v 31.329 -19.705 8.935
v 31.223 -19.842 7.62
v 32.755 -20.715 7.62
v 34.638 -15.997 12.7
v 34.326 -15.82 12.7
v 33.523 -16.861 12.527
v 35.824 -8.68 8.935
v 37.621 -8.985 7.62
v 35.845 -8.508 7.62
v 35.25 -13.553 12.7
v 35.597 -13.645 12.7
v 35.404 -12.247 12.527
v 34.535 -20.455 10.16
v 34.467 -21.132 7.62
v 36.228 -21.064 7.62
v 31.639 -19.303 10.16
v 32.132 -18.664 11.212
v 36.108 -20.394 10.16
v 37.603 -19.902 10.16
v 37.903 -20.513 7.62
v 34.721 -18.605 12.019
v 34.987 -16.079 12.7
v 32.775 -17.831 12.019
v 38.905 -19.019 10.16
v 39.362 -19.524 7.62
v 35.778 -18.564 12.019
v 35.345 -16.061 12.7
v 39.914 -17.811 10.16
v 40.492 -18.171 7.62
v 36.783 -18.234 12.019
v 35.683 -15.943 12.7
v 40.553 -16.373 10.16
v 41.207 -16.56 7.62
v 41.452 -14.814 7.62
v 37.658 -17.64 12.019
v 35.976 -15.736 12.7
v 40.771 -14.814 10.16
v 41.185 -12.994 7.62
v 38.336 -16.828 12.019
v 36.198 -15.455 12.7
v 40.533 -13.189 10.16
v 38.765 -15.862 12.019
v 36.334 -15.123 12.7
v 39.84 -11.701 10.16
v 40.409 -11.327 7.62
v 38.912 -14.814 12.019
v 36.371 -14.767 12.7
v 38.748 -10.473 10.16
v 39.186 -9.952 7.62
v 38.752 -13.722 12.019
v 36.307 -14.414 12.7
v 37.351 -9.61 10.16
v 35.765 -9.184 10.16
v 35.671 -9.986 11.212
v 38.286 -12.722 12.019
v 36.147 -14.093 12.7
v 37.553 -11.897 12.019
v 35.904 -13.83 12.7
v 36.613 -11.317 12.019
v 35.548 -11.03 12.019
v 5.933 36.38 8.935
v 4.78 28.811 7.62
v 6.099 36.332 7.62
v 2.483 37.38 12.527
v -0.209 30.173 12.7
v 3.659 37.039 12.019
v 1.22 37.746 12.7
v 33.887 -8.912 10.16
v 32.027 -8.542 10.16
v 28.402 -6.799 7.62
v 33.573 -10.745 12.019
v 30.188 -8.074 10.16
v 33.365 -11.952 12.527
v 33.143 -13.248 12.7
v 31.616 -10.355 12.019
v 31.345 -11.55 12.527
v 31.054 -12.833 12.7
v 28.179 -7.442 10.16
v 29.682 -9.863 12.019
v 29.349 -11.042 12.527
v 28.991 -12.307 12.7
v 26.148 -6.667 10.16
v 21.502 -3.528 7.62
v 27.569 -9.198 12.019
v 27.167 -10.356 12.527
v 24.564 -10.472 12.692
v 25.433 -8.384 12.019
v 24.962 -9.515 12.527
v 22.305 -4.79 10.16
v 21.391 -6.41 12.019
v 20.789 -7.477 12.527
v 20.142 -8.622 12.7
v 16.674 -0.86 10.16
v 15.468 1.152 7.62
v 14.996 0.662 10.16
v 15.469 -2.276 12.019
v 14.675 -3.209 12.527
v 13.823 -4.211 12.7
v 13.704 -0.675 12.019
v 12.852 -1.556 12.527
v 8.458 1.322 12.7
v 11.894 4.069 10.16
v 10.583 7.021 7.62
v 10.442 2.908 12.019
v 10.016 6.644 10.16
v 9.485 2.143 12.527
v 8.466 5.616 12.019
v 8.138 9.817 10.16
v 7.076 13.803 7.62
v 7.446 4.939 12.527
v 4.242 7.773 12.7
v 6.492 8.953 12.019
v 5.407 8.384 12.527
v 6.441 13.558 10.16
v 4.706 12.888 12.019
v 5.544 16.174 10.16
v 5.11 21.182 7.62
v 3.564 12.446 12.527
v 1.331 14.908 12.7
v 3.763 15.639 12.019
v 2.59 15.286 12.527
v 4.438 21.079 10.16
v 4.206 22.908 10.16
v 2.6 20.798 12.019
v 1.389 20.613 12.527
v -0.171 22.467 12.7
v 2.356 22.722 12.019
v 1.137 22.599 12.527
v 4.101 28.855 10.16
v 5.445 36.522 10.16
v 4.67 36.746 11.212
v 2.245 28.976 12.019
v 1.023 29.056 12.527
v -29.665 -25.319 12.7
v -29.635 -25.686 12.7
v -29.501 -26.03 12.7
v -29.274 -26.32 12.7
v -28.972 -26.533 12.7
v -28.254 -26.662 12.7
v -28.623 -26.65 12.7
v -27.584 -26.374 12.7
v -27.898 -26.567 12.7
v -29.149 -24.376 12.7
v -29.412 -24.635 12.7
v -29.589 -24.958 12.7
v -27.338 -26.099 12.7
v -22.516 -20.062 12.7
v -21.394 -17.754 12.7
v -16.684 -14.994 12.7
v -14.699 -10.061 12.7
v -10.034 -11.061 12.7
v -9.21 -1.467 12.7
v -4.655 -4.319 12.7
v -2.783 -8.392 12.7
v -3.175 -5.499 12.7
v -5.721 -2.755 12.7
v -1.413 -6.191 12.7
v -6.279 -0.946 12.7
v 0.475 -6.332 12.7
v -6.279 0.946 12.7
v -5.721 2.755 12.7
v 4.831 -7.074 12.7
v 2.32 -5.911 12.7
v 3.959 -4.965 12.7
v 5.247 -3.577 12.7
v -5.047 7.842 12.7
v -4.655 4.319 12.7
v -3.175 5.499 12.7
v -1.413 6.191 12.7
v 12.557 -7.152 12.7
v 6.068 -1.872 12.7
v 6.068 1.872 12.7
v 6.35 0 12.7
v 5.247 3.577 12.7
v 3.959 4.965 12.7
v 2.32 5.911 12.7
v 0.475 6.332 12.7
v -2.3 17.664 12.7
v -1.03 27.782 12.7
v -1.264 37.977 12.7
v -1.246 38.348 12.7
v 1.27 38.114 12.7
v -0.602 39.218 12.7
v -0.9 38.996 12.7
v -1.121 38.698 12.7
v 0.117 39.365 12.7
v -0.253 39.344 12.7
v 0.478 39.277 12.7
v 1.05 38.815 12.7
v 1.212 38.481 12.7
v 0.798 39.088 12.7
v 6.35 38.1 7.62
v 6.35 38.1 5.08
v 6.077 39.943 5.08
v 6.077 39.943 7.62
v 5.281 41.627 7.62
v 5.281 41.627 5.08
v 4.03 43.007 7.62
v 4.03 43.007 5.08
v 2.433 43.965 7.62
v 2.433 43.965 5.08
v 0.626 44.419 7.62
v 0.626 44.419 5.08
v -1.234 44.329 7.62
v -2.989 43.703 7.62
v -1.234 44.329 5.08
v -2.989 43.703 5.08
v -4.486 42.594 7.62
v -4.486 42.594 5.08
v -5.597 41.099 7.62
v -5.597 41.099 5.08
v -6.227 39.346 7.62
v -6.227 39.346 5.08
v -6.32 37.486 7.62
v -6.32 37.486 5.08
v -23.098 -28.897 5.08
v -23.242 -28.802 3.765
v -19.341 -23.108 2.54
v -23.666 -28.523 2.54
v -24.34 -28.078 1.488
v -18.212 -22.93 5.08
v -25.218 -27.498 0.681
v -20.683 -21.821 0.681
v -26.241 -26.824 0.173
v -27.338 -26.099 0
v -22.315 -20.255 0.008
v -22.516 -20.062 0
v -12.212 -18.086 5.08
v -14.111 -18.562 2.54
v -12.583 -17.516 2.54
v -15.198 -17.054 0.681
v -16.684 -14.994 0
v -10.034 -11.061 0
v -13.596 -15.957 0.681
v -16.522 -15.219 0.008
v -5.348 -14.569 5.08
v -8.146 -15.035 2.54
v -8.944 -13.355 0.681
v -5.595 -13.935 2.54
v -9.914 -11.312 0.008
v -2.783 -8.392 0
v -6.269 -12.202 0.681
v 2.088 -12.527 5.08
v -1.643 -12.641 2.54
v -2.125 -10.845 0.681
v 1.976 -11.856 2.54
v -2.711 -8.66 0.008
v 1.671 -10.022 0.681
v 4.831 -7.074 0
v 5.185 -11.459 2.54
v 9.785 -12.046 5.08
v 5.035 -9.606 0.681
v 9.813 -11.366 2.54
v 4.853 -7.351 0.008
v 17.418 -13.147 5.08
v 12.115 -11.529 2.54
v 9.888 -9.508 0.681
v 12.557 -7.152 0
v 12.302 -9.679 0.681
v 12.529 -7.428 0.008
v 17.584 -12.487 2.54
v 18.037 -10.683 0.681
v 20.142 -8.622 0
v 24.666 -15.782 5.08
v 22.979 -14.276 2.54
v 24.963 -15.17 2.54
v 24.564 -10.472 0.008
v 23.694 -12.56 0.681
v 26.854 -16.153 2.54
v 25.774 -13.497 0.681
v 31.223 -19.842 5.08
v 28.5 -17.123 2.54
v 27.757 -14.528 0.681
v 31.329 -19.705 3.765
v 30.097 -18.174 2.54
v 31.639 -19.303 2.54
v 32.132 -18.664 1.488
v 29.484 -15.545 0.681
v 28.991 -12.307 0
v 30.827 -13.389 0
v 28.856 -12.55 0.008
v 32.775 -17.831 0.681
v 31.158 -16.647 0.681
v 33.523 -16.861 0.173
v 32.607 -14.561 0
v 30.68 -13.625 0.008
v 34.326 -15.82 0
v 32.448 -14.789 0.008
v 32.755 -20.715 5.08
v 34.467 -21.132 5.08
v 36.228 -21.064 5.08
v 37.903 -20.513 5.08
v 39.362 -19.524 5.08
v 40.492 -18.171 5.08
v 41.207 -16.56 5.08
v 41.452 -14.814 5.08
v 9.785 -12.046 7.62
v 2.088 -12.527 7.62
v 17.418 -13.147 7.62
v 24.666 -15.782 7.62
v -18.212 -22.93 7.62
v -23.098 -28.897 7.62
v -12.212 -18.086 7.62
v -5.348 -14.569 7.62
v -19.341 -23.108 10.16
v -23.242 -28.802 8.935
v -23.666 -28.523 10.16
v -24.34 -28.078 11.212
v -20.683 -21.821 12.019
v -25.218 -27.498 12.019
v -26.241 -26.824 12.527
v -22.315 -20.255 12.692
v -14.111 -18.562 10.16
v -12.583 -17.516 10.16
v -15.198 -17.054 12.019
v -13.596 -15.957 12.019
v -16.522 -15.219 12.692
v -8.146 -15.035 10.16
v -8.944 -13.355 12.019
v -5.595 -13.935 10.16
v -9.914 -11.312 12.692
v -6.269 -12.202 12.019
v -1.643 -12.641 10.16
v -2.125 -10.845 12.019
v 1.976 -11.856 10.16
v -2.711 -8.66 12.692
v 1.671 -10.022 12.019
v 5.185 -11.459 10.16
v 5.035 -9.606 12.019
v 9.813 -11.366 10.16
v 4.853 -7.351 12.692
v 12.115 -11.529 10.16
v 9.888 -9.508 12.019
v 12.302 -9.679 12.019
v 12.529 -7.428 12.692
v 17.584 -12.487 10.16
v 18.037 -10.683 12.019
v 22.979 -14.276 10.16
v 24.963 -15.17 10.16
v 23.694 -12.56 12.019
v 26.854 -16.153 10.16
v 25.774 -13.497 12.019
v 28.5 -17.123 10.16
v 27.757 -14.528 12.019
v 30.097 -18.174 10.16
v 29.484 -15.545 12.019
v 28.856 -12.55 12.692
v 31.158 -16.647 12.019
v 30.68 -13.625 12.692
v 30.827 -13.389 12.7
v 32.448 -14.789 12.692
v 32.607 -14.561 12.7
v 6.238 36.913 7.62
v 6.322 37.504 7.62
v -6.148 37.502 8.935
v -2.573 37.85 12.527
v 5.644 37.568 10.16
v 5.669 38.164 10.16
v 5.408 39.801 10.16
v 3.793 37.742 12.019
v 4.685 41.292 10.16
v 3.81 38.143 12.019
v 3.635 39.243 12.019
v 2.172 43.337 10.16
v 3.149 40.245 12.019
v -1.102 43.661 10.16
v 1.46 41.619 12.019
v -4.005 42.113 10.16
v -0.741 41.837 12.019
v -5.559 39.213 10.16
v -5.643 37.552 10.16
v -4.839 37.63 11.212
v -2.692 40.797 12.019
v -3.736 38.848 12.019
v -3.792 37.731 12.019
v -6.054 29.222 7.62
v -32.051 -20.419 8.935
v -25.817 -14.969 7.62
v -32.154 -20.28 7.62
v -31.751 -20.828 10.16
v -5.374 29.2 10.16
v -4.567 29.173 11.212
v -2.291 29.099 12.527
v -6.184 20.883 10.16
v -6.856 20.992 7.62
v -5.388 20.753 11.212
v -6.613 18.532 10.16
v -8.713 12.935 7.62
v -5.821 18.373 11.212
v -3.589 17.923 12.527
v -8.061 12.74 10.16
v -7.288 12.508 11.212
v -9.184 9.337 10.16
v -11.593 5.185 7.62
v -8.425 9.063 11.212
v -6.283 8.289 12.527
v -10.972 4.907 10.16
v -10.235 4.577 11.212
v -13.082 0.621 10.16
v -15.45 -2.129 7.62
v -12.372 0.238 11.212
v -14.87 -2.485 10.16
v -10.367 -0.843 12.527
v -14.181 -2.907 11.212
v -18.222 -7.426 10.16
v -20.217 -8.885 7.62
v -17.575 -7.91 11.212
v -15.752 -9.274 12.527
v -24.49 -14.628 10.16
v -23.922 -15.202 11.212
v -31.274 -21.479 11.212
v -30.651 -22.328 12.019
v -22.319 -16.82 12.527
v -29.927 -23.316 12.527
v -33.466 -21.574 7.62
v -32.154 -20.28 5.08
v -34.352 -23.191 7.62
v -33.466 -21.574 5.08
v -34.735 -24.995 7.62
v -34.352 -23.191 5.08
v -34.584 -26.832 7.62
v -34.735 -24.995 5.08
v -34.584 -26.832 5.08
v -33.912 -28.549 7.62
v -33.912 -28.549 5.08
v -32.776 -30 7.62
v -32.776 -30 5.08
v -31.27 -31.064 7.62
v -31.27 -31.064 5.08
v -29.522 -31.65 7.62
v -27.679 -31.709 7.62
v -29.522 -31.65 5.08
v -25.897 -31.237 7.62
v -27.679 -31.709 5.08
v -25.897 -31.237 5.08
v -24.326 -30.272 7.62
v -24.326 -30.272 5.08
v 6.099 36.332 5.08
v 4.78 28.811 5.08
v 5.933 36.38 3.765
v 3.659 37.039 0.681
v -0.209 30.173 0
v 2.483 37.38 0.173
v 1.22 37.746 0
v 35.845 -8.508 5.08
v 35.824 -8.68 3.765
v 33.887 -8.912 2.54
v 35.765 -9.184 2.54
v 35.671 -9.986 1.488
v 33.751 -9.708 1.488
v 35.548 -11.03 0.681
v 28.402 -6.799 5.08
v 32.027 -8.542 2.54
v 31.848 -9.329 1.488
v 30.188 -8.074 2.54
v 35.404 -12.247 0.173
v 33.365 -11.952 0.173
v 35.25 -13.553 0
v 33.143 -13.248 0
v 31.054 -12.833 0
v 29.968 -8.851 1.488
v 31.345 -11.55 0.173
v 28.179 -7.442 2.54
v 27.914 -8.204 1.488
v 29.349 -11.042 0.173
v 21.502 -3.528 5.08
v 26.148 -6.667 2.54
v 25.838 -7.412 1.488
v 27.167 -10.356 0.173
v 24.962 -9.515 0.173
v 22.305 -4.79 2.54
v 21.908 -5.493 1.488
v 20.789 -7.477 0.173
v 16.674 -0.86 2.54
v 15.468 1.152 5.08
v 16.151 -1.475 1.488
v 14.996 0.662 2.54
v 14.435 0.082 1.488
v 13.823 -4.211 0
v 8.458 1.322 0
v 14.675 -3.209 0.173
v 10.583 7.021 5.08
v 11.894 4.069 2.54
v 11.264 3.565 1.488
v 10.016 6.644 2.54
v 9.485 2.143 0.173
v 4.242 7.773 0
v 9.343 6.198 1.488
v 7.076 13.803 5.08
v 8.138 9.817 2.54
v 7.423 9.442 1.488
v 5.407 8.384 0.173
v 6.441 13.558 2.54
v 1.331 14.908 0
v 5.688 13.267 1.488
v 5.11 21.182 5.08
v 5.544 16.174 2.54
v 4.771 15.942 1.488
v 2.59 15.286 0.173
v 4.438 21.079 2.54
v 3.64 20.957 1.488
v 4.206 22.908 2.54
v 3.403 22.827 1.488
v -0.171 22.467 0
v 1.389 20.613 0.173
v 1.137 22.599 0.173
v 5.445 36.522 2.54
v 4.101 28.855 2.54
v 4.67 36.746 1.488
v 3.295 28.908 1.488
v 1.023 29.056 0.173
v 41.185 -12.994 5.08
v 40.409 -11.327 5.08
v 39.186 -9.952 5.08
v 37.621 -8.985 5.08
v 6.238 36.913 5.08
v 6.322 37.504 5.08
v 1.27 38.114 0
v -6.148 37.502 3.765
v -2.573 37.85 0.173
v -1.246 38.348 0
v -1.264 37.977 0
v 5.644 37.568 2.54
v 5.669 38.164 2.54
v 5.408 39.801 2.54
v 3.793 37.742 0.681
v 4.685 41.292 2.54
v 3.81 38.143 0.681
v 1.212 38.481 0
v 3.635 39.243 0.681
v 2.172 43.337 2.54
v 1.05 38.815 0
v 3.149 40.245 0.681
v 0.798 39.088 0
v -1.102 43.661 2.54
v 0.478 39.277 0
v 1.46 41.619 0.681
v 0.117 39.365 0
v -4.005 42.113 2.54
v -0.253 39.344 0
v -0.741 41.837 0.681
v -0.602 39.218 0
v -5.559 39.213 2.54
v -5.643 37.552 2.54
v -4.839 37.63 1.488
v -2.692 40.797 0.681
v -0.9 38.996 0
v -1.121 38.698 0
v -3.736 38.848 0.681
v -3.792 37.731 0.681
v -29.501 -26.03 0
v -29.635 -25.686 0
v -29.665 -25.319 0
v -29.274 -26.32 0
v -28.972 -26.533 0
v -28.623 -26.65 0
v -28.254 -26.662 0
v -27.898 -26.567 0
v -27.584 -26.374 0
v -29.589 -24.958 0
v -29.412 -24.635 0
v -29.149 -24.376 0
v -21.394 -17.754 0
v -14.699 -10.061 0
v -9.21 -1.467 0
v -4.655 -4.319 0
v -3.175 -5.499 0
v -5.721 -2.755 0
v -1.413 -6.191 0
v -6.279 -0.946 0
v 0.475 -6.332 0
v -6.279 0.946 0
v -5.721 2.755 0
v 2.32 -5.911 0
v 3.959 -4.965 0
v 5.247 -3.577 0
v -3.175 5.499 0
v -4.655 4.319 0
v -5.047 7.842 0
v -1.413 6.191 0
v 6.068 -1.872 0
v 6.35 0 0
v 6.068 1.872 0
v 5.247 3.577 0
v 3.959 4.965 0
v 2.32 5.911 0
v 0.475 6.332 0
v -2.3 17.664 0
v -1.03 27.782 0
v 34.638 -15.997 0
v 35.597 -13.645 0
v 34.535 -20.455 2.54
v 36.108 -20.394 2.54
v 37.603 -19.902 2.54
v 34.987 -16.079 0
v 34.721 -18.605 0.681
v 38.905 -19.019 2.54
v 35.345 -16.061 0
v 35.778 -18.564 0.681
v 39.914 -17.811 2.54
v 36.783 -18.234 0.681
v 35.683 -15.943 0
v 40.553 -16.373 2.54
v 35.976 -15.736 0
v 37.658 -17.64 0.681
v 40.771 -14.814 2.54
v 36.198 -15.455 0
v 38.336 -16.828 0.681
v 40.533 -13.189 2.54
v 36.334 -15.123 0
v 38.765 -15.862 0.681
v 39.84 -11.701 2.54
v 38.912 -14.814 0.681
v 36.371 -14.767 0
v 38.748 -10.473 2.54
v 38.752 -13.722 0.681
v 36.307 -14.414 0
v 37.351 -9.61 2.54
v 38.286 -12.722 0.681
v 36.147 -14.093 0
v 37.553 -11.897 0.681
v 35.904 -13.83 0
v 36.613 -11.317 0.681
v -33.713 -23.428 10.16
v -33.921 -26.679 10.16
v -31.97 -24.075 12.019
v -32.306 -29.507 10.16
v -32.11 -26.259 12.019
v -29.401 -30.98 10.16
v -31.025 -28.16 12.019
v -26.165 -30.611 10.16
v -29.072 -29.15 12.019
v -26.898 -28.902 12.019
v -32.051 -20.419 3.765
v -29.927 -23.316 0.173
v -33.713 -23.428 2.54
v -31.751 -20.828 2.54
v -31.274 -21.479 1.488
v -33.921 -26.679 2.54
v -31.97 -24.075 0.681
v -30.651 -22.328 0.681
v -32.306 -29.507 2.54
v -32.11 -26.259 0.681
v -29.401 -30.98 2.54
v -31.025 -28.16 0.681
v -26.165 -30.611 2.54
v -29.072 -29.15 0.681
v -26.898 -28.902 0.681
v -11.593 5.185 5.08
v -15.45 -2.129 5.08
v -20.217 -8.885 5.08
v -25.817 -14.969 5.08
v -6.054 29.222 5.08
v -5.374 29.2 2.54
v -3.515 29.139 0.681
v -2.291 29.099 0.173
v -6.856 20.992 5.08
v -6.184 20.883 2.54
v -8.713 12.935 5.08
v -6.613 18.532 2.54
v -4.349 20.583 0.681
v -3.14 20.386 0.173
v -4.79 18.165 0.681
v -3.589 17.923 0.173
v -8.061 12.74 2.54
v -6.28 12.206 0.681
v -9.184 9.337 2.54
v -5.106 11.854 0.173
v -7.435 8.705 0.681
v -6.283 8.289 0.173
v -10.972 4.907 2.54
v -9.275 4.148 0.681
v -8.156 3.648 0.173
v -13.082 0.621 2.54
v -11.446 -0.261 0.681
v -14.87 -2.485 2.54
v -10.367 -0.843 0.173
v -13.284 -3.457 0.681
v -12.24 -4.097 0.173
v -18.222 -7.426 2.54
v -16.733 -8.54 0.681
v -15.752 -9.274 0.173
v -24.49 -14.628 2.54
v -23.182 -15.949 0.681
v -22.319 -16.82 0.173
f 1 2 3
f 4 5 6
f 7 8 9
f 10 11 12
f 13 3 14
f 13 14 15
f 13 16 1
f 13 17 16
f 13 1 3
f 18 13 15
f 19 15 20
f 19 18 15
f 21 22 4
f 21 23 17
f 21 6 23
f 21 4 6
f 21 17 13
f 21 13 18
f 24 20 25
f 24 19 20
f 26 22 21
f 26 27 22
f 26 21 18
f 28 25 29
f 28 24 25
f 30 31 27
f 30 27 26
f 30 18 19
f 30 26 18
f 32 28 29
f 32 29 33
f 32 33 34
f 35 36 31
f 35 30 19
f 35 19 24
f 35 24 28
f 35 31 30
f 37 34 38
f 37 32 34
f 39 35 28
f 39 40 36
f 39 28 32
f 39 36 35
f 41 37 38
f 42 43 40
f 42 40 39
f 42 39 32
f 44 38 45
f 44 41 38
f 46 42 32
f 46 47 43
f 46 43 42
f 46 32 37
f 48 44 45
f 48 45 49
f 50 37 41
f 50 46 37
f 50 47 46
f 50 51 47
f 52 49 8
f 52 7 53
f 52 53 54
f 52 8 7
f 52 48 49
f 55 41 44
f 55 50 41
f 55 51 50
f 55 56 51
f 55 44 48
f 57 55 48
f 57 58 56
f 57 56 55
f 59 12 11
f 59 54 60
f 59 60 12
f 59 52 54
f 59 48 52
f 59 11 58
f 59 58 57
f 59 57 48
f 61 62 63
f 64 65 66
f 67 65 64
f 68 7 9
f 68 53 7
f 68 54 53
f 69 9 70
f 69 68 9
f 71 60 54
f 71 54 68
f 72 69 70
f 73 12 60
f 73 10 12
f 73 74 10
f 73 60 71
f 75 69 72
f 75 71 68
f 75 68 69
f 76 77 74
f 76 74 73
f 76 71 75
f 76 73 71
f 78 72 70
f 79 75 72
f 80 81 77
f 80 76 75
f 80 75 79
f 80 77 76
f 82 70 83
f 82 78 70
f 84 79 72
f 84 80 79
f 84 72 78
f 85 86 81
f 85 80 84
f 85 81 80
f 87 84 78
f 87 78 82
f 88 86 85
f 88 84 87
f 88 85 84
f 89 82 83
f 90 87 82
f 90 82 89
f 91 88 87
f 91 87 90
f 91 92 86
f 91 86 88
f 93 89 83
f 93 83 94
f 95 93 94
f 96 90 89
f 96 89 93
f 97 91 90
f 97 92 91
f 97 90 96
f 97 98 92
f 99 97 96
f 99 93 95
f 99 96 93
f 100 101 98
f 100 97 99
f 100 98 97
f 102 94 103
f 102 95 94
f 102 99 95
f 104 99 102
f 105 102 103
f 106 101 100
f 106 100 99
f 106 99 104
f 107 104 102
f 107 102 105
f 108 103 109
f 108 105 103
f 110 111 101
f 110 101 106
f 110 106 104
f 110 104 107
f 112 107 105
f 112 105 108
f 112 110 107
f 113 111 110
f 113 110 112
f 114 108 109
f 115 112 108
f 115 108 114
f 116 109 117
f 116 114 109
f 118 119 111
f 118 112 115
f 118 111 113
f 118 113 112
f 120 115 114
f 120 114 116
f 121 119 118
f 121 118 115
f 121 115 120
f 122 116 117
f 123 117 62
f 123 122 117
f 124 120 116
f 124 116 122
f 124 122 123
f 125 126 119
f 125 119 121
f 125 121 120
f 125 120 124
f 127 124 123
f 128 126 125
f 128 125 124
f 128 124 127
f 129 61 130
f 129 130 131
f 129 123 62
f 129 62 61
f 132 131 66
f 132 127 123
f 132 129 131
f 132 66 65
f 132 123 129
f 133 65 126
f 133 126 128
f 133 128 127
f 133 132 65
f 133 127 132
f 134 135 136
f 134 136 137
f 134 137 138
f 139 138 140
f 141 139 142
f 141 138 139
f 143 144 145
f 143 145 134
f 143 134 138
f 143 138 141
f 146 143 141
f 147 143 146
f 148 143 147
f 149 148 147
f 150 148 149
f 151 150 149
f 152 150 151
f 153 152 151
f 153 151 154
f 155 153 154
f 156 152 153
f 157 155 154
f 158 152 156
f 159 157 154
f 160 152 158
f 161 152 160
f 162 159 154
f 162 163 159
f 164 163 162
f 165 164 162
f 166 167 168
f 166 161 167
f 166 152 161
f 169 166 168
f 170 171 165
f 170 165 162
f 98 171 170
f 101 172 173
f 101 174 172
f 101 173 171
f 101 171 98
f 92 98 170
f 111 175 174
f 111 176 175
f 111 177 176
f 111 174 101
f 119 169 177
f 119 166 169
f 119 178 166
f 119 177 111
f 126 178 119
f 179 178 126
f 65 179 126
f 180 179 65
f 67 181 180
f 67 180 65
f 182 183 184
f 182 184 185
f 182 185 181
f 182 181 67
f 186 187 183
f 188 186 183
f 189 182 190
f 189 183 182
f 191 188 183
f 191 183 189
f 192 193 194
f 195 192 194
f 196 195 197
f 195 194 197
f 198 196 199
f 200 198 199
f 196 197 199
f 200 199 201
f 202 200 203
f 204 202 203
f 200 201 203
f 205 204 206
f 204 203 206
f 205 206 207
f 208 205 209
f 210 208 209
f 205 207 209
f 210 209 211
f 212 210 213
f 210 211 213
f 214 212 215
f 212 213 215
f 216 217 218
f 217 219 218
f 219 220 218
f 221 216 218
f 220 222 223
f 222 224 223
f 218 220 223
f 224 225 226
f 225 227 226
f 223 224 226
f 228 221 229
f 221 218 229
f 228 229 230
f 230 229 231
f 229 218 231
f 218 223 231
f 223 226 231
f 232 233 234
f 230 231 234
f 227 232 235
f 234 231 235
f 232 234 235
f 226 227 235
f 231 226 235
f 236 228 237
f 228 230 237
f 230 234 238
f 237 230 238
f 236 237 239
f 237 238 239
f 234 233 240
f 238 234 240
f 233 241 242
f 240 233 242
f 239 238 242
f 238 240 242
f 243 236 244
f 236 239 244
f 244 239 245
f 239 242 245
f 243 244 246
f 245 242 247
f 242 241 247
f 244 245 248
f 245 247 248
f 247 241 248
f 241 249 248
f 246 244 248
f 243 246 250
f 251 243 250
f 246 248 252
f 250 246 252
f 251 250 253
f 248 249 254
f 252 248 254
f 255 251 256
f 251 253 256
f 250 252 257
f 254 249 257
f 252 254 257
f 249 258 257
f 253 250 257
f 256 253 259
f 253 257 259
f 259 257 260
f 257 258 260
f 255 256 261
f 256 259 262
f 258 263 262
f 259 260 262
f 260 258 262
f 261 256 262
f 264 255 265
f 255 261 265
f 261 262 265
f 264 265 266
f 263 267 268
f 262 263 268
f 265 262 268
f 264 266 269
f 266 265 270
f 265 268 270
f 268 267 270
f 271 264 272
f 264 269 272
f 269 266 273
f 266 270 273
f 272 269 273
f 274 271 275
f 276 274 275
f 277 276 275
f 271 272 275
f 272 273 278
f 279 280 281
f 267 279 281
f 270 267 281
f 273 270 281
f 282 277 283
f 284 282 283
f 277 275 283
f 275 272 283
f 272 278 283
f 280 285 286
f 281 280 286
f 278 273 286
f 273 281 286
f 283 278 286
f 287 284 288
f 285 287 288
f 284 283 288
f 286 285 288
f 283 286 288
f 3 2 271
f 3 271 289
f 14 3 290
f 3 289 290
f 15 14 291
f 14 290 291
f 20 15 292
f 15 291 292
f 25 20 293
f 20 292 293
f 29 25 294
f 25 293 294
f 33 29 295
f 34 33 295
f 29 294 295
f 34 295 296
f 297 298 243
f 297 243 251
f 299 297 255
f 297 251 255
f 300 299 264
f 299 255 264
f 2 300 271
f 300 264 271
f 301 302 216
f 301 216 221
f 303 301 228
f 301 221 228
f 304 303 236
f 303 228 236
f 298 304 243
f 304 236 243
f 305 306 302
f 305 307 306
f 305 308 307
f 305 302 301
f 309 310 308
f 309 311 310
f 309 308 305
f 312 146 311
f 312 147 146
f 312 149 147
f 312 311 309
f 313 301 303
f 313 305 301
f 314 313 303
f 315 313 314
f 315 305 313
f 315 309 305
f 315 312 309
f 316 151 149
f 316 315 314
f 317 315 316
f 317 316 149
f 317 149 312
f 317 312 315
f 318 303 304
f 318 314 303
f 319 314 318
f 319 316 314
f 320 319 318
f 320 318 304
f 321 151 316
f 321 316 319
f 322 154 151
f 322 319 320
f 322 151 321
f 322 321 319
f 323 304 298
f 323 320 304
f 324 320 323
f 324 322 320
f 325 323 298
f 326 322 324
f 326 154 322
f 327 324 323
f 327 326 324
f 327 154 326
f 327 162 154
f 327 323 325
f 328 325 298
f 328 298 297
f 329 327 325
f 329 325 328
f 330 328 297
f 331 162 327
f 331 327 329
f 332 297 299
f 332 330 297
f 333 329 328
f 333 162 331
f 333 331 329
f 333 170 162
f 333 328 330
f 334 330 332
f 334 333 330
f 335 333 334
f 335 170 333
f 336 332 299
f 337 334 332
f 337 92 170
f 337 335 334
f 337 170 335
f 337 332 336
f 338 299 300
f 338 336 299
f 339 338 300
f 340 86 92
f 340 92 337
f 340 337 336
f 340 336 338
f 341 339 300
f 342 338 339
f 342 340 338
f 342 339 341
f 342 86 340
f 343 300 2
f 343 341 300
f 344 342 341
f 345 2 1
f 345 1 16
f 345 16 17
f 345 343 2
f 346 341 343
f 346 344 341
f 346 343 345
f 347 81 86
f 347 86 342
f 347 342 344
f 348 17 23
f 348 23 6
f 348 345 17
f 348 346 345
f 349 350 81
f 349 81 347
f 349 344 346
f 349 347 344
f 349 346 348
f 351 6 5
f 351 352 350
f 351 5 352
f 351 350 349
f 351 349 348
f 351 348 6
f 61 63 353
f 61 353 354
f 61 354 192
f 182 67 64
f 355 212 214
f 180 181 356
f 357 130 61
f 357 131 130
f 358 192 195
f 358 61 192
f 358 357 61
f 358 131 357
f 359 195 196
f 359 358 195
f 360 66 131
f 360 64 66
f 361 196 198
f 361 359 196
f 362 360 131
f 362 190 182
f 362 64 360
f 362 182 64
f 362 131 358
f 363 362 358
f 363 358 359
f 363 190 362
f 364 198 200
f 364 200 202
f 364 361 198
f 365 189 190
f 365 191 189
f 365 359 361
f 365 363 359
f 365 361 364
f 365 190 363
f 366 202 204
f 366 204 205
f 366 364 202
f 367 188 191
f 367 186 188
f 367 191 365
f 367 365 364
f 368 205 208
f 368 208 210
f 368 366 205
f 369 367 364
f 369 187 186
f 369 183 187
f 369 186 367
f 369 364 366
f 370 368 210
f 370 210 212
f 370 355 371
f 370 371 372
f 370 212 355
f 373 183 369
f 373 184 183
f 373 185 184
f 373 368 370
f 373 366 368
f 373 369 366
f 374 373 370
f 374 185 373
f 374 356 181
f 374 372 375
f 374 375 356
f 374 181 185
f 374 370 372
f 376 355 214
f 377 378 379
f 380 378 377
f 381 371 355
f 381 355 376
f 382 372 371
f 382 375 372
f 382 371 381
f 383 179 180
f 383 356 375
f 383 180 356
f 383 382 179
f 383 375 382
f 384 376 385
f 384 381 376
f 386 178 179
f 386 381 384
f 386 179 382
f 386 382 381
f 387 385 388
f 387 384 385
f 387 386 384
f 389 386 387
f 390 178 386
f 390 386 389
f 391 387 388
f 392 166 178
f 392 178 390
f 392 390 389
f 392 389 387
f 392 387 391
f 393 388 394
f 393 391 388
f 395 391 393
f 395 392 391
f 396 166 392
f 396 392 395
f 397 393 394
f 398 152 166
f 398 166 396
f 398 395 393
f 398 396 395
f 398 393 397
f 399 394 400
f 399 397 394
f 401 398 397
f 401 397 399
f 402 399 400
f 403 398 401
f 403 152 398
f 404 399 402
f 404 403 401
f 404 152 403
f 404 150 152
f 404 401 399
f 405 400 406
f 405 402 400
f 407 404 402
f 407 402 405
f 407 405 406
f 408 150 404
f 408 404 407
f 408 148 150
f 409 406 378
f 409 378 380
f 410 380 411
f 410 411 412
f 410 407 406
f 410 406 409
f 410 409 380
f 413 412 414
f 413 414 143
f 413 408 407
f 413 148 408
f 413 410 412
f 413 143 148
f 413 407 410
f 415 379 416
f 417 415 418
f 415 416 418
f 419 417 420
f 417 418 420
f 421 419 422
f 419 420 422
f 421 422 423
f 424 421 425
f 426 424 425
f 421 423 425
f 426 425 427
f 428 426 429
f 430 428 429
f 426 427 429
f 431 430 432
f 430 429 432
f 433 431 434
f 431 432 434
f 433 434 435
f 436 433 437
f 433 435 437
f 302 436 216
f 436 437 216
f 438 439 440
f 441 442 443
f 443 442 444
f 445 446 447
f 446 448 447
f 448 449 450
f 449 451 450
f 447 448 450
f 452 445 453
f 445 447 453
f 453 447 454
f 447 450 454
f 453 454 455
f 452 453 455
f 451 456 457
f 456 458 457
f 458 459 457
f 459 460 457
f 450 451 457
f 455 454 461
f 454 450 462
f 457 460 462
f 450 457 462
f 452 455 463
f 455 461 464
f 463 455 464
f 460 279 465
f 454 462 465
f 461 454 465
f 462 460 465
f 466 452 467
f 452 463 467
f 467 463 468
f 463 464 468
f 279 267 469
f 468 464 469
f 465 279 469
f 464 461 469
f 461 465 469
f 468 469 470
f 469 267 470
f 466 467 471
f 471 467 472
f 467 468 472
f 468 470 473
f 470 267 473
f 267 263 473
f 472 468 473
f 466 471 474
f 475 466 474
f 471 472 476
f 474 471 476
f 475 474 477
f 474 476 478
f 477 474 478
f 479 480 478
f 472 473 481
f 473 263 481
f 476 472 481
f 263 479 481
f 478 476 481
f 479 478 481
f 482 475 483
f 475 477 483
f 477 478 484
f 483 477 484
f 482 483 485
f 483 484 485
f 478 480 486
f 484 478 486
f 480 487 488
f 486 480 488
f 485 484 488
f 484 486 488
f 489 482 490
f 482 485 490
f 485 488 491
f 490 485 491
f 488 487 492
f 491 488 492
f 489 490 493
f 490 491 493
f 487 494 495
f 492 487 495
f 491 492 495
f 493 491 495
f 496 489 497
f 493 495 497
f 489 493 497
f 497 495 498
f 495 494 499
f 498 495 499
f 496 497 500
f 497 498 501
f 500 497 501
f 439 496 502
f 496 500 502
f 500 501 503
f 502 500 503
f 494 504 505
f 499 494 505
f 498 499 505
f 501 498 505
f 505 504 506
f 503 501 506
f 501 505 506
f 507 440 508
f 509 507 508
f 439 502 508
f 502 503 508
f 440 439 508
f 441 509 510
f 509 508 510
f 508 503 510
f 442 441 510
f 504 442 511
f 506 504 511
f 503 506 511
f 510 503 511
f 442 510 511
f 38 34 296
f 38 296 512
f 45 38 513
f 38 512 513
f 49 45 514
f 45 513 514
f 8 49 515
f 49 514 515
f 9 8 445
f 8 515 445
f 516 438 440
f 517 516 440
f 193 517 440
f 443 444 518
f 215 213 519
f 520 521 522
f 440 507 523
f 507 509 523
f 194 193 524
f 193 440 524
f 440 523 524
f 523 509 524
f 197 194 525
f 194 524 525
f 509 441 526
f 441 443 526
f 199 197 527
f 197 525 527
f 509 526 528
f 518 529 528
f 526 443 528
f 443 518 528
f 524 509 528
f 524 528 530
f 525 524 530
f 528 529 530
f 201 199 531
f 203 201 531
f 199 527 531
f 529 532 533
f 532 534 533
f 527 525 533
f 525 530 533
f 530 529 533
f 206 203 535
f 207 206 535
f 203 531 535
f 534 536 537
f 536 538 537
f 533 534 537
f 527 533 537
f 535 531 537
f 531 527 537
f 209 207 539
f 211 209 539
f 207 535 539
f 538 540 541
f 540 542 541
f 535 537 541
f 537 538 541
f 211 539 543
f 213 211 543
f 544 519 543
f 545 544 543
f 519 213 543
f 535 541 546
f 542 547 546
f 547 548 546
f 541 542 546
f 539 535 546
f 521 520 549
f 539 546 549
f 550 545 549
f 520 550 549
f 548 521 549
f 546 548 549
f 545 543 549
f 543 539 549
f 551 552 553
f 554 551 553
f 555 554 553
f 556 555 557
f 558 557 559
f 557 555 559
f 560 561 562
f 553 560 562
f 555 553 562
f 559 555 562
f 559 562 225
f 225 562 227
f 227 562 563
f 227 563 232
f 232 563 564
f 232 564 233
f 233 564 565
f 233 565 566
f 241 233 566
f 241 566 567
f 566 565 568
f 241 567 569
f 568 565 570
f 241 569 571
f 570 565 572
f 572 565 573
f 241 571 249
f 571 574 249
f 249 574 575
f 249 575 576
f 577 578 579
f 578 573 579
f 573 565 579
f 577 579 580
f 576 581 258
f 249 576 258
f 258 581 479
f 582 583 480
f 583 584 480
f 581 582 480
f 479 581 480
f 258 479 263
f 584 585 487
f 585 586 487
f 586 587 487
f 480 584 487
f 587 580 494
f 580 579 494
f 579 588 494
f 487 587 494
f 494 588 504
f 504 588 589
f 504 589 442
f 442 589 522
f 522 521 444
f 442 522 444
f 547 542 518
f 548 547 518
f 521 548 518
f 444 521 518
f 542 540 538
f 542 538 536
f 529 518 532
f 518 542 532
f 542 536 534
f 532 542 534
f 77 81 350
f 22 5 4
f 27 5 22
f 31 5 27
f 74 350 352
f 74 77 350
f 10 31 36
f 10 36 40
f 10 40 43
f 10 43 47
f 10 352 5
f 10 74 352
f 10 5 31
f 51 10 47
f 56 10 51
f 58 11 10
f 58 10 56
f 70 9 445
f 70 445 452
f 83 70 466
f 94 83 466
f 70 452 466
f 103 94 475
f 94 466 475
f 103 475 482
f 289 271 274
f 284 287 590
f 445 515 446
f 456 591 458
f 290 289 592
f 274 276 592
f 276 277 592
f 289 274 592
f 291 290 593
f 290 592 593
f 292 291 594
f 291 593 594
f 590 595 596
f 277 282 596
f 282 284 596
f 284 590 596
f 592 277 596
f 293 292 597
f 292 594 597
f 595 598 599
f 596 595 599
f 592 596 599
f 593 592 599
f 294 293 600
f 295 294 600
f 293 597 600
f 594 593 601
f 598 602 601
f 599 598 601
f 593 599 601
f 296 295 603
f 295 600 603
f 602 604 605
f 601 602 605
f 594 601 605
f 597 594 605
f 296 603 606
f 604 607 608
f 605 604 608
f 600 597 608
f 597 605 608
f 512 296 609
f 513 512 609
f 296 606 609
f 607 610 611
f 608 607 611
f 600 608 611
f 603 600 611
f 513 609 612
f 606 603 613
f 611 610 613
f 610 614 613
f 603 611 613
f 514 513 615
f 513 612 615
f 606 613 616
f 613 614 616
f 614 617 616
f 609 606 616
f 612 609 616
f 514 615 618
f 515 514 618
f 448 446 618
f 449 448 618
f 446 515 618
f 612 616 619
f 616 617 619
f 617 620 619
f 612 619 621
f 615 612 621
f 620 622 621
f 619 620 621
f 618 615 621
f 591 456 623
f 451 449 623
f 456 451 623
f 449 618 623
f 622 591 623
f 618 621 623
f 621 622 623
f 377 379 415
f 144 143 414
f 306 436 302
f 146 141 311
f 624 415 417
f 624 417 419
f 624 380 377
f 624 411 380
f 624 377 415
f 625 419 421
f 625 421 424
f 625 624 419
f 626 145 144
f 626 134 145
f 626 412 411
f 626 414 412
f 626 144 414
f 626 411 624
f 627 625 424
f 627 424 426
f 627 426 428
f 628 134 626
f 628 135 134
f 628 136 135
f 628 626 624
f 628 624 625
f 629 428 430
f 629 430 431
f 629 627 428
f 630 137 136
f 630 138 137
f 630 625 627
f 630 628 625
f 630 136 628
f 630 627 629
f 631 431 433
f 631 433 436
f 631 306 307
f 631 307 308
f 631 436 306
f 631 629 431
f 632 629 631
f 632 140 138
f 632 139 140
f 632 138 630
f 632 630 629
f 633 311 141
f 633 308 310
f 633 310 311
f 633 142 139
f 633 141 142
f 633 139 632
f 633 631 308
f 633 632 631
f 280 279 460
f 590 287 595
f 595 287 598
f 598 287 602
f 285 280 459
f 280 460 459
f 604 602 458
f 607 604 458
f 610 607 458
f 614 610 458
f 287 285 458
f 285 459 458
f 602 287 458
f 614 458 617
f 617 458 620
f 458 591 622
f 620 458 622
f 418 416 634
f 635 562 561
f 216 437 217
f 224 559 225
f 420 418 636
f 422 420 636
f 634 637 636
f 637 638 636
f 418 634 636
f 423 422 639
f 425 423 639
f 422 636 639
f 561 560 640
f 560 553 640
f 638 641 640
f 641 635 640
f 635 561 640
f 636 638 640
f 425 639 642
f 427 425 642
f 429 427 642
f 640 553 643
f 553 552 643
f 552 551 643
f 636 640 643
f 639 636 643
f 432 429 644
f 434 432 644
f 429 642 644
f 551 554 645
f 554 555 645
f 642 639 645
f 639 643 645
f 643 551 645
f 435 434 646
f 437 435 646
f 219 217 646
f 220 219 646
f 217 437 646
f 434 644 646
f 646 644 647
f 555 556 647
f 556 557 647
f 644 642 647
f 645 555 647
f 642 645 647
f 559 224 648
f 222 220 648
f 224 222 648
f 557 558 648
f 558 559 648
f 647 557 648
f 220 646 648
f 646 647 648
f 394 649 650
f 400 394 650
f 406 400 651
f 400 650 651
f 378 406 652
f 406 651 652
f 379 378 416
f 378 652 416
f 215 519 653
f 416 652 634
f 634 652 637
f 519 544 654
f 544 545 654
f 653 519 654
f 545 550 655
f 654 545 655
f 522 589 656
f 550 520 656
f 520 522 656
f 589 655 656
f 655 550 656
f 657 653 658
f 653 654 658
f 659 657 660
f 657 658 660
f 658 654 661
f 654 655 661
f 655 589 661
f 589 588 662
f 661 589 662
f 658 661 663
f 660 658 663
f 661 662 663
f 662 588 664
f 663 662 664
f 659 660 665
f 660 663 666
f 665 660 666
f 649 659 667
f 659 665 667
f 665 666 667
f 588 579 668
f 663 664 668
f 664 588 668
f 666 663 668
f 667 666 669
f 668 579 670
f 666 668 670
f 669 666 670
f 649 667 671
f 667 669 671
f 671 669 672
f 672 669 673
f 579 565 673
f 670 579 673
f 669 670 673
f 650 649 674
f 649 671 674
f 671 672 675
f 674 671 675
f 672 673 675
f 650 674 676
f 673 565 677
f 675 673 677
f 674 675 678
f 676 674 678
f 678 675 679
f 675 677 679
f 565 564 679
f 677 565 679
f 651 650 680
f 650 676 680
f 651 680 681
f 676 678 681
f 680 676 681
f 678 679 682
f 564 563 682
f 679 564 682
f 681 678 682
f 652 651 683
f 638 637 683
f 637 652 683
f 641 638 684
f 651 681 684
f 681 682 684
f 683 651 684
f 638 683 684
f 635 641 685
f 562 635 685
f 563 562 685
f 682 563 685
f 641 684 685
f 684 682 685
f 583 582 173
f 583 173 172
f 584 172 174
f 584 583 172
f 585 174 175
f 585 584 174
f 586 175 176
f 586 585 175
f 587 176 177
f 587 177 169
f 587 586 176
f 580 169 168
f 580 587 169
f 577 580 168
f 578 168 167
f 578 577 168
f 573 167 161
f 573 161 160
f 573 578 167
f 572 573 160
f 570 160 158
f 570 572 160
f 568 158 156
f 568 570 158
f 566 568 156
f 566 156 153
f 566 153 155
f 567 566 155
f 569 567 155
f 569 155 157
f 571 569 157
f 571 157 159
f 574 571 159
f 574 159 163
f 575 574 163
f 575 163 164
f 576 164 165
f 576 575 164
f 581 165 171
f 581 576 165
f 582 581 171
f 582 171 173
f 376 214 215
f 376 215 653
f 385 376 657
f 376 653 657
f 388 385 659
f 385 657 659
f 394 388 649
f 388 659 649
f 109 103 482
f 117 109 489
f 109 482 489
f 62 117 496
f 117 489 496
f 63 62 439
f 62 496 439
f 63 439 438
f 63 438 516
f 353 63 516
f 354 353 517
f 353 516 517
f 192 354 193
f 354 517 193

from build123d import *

# Parameters (mm, degrees)
F0_R         = 6.35
F1_DEPTH     = 12.7
F2_T2_ANGLE  = 99.446116479
F2_T4_ANGLE  = 59.2916827944
F2_T6_ANGLE  = 201.7148311049
F2_T8_ANGLE  = 200.3212768017
F2_T10_ANGLE = 94.2324188496
F2_T12_ANGLE = 210.9341102164
F2_T14_ANGLE = 94.2324188496
F2_T16_ANGLE = 210.9341102164
F2_T18_ANGLE = 200.3212768017
F2_T20_ANGLE = 59.2916827944
F2_T22_ANGLE = 201.7148311049
F2_T24_ANGLE = 99.446116479


# Not quite as in the source:
# - a fillet or chamfer that OpenCascade refuses, or shapes differently, is made with other operations: its cross-section is extruded or revolved along the edge and cut away or added


with BuildPart() as f1:
    # F0 (on Top) → F1 (new body)
    with BuildSketch(Plane.XY):
        with BuildLine():
            ThreePointArc((-23.0979636954, -28.8973481426), (-12.2116587197, -18.0861984821), (2.0883176929, -12.527127732))
            ThreePointArc((2.0883176929, -12.527127732), (-10.0506029407, -7.7637220795), (-11.5934607492, 5.1847534038))
            ThreePointArc((-11.5934607492, 5.1847534038), (-20.2173700121, -8.8847131705), (-32.1537121721, -20.2796873478))
            ThreePointArc((-32.1537121721, -20.2796873478), (-25.5280345903, -19.7355993147), (-22.0480633142, -25.4))
            ThreePointArc((-22.0480633142, -25.4), (-22.3161995958, -27.2257693475), (-23.0979636954, -28.8973481426))
        make_face()
        with BuildLine():
            ThreePointArc((10.5830984733, 7.0205431916), (12.1592629425, 3.6663775985), (12.7, 0))
            ThreePointArc((12.7, 0), (9.6905013983, -8.2087869171), (2.0883176929, -12.527127732))
            ThreePointArc((2.0883176929, -12.527127732), (17.4183090092, -13.1467749254), (31.2229657331, -19.8418514101))
            ThreePointArc((31.2229657331, -19.8418514101), (29.2220209534, -12.4165925694), (35.8447458338, -8.5079145294))
            ThreePointArc((35.8447458338, -8.5079145294), (21.5024747262, -3.5278630909), (10.5830984733, 7.0205431916))
        make_face()
        with BuildLine():
            ThreePointArc((-11.5934607492, 5.1847534038), (-1.0477304131, 12.6567081416), (10.5830984733, 7.0205431916))
            ThreePointArc((10.5830984733, 7.0205431916), (5.1104904876, 21.1821889646), (6.0989820006, 36.3322560831))
            ThreePointArc((6.0989820006, 36.3322560831), (-0.5872613397, 31.7772138958), (-6.320221624, 37.4857536138))
            ThreePointArc((-6.320221624, 37.4857536138), (-6.8559724512, 20.992280129), (-11.5934607492, 5.1847534038))
        make_face()
        with BuildLine():
            ThreePointArc((2.0883176929, -12.527127732), (9.6905013983, -8.2087869171), (12.7, 0))
            ThreePointArc((12.7, 0), (12.1592629425, 3.6663775985), (10.5830984733, 7.0205431916))
            ThreePointArc((10.5830984733, 7.0205431916), (-1.0477304131, 12.6567081416), (-11.5934607492, 5.1847534038))
            ThreePointArc((-11.5934607492, 5.1847534038), (-10.0506029407, -7.7637220795), (2.0883176929, -12.527127732))
        make_face()
        Circle(F0_R, mode=Mode.SUBTRACT)
        with BuildLine():
            ThreePointArc((-32.1537121721, -20.2796873478), (-32.7755456308, -30.0000161487), (-23.0979636954, -28.8973481426))
            ThreePointArc((-23.0979636954, -28.8973481426), (-22.3161995958, -27.2257693475), (-22.0480633142, -25.4))
            ThreePointArc((-22.0480633142, -25.4), (-25.5280345903, -19.7355993147), (-32.1537121721, -20.2796873478))
        make_face()
        with BuildLine():
            ThreePointArc((41.4519366858, -14.8143187798), (39.8474260225, -10.5949786709), (35.8447458338, -8.5079145294))
            ThreePointArc((35.8447458338, -8.5079145294), (29.2220209534, -12.4165925694), (31.2229657331, -19.8418514101))
            ThreePointArc((31.2229657331, -19.8418514101), (37.9029217313, -20.5131768035), (41.4519366858, -14.8143187798))
        make_face()
        with BuildLine():
            ThreePointArc((-6.320221624, 37.4857536138), (-0.5872613397, 31.7772138958), (6.0989820006, 36.3322560831))
            ThreePointArc((6.0989820006, 36.3322560831), (6.2869323085, 37.2072614336), (6.35, 38.1))
            ThreePointArc((6.35, 38.1), (-0.3074838917, 44.442551037), (-6.320221624, 37.4857536138))
        make_face()
    extrude(amount=F1_DEPTH)

    # F2: fillet of radius 5.08 on 12 edges, made by hand

    # F2_s1 → F2_t2 (revolve, cut)
    with BuildSketch(Plane(origin=(36.3426576492, -4.2806736606, 0), x_dir=(0, 0, 1), z_dir=(0.9931345276, -0.1169778186, 0))):
        with BuildLine():
            ThreePointArc((7.62, 4.2564635014), (11.2121024484, 5.744361053), (12.7, 9.3364635014))
            Line((12.7, 9.3364635014), (12.7, 4.2564635014))
            Line((12.7, 4.2564635014), (7.62, 4.2564635014))
        make_face()
    revolve(axis=Axis((39.9699722036, 26.5150051248, 12.7), (0, 0, -1)), revolution_arc=F2_T2_ANGLE, mode=Mode.SUBTRACT)

    # F2_s3 → F2_t4 (revolve, cut)
    with BuildSketch(Plane(origin=(-3.6681952371, 37.7434973641, 0), x_dir=(0, 0, 1), z_dir=(-0.0967317144, 0.995310492, 0))):
        with BuildLine():
            ThreePointArc((7.62, -2.6645216828), (11.2121024484, -1.1766241312), (12.7, 2.4154783172))
            Line((12.7, 2.4154783172), (12.7, -2.6645216828))
            Line((12.7, -2.6645216828), (7.62, -2.6645216828))
        make_face()
    revolve(axis=Axis((-69.9851672009, 31.2983182556, 12.7), (0, 0, -1)), revolution_arc=F2_T4_ANGLE, mode=Mode.SUBTRACT)

    # F2_s5 → F2_t6 (revolve, cut)
    with BuildSketch(Plane(origin=(10.1871858245, 35.1473210497, 0), x_dir=(0, 0, 1), z_dir=(-0.2783848688, -0.9604696064, 0))):
        with BuildLine():
            ThreePointArc((7.62, 4.2564635014), (11.2121024484, 5.744361053), (12.7, 9.3364635014))
            Line((12.7, 9.3364635014), (12.7, 4.2564635014))
            Line((12.7, 4.2564635014), (7.62, 4.2564635014))
        make_face()
    revolve(axis=Axis((0, 38.1, 12.7), (0, 0, 1)), revolution_arc=F2_T6_ANGLE, mode=Mode.SUBTRACT)

    # F2_s7 → F2_t8 (revolve, cut)
    with BuildSketch(Plane(origin=(-30.5778054296, -22.4282202745, 0), x_dir=(0, 0, 1), z_dir=(0.8063484492, 0.591440765, 0))):
        with BuildLine():
            ThreePointArc((7.62, -2.6645216828), (11.2121024484, -1.1766241312), (12.7, 2.4154783172))
            Line((12.7, 2.4154783172), (12.7, -2.6645216828))
            Line((12.7, -2.6645216828), (7.62, -2.6645216828))
        make_face()
    revolve(axis=Axis((-28.3980633142, -25.4, 12.7), (0, 0, 1)), revolution_arc=F2_T8_ANGLE, mode=Mode.SUBTRACT)

    # F2_s9 → F2_t10 (revolve, cut)
    with BuildSketch(Plane(origin=(-20.2906858047, -30.7497714597, 0), x_dir=(0, 0, 1), z_dir=(-0.550763487, -0.8346613573, 0))):
        with BuildLine():
            ThreePointArc((5.08, 3.3633735001), (1.4878975516, 4.8512710517), (0, 8.4433735001))
            Line((0, 8.4433735001), (0, 3.3633735001))
            Line((0, 3.3633735001), (5.08, 3.3633735001))
        make_face()
    revolve(axis=Axis((8.2675580223, -49.5943457482, 0), (0, 0, -1)), revolution_arc=F2_T10_ANGLE, mode=Mode.SUBTRACT)

    # F2_s11 → F2_t12 (revolve, cut)
    with BuildSketch(Plane(origin=(29.1684101252, -22.5047600746, 0), x_dir=(0, 0, 1), z_dir=(-0.7917374221, 0.6108615673, 0))):
        with BuildLine():
            ThreePointArc((5.08, 3.3633735001), (1.4878975516, 4.8512710517), (0, 8.4433735001))
            Line((0, 8.4433735001), (0, 3.3633735001))
            Line((0, 3.3633735001), (5.08, 3.3633735001))
        make_face()
    revolve(axis=Axis((35.1019366858, -14.8143187798, 0), (0, 0, 1)), revolution_arc=F2_T12_ANGLE, mode=Mode.SUBTRACT)

    # F2_s13 → F2_t14 (revolve, cut)
    with BuildSketch(Plane(origin=(-20.2906858047, -30.7497714597, 0), x_dir=(0, 0, 1), z_dir=(-0.550763487, -0.8346613573, 0))):
        with BuildLine():
            ThreePointArc((7.62, 3.3633735001), (11.2121024484, 4.8512710517), (12.7, 8.4433735001))
            Line((12.7, 8.4433735001), (12.7, 3.3633735001))
            Line((12.7, 3.3633735001), (7.62, 3.3633735001))
        make_face()
    revolve(axis=Axis((8.2675580223, -49.5943457482, 12.7), (0, 0, -1)), revolution_arc=F2_T14_ANGLE, mode=Mode.SUBTRACT)

    # F2_s15 → F2_t16 (revolve, cut)
    with BuildSketch(Plane(origin=(29.1684101252, -22.5047600746, 0), x_dir=(0, 0, 1), z_dir=(-0.7917374221, 0.6108615673, 0))):
        with BuildLine():
            ThreePointArc((7.62, 3.3633735001), (11.2121024484, 4.8512710517), (12.7, 8.4433735001))
            Line((12.7, 8.4433735001), (12.7, 3.3633735001))
            Line((12.7, 3.3633735001), (7.62, 3.3633735001))
        make_face()
    revolve(axis=Axis((35.1019366858, -14.8143187798, 12.7), (0, 0, 1)), revolution_arc=F2_T16_ANGLE, mode=Mode.SUBTRACT)

    # F2_s17 → F2_t18 (revolve, cut)
    with BuildSketch(Plane(origin=(-30.5778054296, -22.4282202745, 0), x_dir=(0, 0, 1), z_dir=(0.8063484492, 0.591440765, 0))):
        with BuildLine():
            ThreePointArc((5.08, -2.6645216828), (1.4878975516, -1.1766241312), (0, 2.4154783172))
            Line((0, 2.4154783172), (0, -2.6645216828))
            Line((0, -2.6645216828), (5.08, -2.6645216828))
        make_face()
    revolve(axis=Axis((-28.3980633142, -25.4, 0), (0, 0, 1)), revolution_arc=F2_T18_ANGLE, mode=Mode.SUBTRACT)

    # F2_s19 → F2_t20 (revolve, cut)
    with BuildSketch(Plane(origin=(-3.6681952371, 37.7434973641, 0), x_dir=(0, 0, 1), z_dir=(-0.0967317144, 0.995310492, 0))):
        with BuildLine():
            ThreePointArc((5.08, -2.6645216828), (1.4878975516, -1.1766241312), (0, 2.4154783172))
            Line((0, 2.4154783172), (0, -2.6645216828))
            Line((0, -2.6645216828), (5.08, -2.6645216828))
        make_face()
    revolve(axis=Axis((-69.9851672009, 31.2983182556, 0), (0, 0, -1)), revolution_arc=F2_T20_ANGLE, mode=Mode.SUBTRACT)

    # F2_s21 → F2_t22 (revolve, cut)
    with BuildSketch(Plane(origin=(10.1871858245, 35.1473210497, 0), x_dir=(0, 0, 1), z_dir=(-0.2783848688, -0.9604696064, 0))):
        with BuildLine():
            ThreePointArc((5.08, 4.2564635014), (1.4878975516, 5.744361053), (0, 9.3364635014))
            Line((0, 9.3364635014), (0, 4.2564635014))
            Line((0, 4.2564635014), (5.08, 4.2564635014))
        make_face()
    revolve(axis=Axis((0, 38.1, 0), (0, 0, 1)), revolution_arc=F2_T22_ANGLE, mode=Mode.SUBTRACT)

    # F2_s23 → F2_t24 (revolve, cut)
    with BuildSketch(Plane(origin=(36.3426576492, -4.2806736606, 0), x_dir=(0, 0, 1), z_dir=(0.9931345276, -0.1169778186, 0))):
        with BuildLine():
            ThreePointArc((5.08, 4.2564635014), (1.4878975516, 5.744361053), (0, 9.3364635014))
            Line((0, 9.3364635014), (0, 4.2564635014))
            Line((0, 4.2564635014), (5.08, 4.2564635014))
        make_face()
    revolve(axis=Axis((39.9699722036, 26.5150051248, 0), (0, 0, -1)), revolution_arc=F2_T24_ANGLE, mode=Mode.SUBTRACT)


solid = f1.part
